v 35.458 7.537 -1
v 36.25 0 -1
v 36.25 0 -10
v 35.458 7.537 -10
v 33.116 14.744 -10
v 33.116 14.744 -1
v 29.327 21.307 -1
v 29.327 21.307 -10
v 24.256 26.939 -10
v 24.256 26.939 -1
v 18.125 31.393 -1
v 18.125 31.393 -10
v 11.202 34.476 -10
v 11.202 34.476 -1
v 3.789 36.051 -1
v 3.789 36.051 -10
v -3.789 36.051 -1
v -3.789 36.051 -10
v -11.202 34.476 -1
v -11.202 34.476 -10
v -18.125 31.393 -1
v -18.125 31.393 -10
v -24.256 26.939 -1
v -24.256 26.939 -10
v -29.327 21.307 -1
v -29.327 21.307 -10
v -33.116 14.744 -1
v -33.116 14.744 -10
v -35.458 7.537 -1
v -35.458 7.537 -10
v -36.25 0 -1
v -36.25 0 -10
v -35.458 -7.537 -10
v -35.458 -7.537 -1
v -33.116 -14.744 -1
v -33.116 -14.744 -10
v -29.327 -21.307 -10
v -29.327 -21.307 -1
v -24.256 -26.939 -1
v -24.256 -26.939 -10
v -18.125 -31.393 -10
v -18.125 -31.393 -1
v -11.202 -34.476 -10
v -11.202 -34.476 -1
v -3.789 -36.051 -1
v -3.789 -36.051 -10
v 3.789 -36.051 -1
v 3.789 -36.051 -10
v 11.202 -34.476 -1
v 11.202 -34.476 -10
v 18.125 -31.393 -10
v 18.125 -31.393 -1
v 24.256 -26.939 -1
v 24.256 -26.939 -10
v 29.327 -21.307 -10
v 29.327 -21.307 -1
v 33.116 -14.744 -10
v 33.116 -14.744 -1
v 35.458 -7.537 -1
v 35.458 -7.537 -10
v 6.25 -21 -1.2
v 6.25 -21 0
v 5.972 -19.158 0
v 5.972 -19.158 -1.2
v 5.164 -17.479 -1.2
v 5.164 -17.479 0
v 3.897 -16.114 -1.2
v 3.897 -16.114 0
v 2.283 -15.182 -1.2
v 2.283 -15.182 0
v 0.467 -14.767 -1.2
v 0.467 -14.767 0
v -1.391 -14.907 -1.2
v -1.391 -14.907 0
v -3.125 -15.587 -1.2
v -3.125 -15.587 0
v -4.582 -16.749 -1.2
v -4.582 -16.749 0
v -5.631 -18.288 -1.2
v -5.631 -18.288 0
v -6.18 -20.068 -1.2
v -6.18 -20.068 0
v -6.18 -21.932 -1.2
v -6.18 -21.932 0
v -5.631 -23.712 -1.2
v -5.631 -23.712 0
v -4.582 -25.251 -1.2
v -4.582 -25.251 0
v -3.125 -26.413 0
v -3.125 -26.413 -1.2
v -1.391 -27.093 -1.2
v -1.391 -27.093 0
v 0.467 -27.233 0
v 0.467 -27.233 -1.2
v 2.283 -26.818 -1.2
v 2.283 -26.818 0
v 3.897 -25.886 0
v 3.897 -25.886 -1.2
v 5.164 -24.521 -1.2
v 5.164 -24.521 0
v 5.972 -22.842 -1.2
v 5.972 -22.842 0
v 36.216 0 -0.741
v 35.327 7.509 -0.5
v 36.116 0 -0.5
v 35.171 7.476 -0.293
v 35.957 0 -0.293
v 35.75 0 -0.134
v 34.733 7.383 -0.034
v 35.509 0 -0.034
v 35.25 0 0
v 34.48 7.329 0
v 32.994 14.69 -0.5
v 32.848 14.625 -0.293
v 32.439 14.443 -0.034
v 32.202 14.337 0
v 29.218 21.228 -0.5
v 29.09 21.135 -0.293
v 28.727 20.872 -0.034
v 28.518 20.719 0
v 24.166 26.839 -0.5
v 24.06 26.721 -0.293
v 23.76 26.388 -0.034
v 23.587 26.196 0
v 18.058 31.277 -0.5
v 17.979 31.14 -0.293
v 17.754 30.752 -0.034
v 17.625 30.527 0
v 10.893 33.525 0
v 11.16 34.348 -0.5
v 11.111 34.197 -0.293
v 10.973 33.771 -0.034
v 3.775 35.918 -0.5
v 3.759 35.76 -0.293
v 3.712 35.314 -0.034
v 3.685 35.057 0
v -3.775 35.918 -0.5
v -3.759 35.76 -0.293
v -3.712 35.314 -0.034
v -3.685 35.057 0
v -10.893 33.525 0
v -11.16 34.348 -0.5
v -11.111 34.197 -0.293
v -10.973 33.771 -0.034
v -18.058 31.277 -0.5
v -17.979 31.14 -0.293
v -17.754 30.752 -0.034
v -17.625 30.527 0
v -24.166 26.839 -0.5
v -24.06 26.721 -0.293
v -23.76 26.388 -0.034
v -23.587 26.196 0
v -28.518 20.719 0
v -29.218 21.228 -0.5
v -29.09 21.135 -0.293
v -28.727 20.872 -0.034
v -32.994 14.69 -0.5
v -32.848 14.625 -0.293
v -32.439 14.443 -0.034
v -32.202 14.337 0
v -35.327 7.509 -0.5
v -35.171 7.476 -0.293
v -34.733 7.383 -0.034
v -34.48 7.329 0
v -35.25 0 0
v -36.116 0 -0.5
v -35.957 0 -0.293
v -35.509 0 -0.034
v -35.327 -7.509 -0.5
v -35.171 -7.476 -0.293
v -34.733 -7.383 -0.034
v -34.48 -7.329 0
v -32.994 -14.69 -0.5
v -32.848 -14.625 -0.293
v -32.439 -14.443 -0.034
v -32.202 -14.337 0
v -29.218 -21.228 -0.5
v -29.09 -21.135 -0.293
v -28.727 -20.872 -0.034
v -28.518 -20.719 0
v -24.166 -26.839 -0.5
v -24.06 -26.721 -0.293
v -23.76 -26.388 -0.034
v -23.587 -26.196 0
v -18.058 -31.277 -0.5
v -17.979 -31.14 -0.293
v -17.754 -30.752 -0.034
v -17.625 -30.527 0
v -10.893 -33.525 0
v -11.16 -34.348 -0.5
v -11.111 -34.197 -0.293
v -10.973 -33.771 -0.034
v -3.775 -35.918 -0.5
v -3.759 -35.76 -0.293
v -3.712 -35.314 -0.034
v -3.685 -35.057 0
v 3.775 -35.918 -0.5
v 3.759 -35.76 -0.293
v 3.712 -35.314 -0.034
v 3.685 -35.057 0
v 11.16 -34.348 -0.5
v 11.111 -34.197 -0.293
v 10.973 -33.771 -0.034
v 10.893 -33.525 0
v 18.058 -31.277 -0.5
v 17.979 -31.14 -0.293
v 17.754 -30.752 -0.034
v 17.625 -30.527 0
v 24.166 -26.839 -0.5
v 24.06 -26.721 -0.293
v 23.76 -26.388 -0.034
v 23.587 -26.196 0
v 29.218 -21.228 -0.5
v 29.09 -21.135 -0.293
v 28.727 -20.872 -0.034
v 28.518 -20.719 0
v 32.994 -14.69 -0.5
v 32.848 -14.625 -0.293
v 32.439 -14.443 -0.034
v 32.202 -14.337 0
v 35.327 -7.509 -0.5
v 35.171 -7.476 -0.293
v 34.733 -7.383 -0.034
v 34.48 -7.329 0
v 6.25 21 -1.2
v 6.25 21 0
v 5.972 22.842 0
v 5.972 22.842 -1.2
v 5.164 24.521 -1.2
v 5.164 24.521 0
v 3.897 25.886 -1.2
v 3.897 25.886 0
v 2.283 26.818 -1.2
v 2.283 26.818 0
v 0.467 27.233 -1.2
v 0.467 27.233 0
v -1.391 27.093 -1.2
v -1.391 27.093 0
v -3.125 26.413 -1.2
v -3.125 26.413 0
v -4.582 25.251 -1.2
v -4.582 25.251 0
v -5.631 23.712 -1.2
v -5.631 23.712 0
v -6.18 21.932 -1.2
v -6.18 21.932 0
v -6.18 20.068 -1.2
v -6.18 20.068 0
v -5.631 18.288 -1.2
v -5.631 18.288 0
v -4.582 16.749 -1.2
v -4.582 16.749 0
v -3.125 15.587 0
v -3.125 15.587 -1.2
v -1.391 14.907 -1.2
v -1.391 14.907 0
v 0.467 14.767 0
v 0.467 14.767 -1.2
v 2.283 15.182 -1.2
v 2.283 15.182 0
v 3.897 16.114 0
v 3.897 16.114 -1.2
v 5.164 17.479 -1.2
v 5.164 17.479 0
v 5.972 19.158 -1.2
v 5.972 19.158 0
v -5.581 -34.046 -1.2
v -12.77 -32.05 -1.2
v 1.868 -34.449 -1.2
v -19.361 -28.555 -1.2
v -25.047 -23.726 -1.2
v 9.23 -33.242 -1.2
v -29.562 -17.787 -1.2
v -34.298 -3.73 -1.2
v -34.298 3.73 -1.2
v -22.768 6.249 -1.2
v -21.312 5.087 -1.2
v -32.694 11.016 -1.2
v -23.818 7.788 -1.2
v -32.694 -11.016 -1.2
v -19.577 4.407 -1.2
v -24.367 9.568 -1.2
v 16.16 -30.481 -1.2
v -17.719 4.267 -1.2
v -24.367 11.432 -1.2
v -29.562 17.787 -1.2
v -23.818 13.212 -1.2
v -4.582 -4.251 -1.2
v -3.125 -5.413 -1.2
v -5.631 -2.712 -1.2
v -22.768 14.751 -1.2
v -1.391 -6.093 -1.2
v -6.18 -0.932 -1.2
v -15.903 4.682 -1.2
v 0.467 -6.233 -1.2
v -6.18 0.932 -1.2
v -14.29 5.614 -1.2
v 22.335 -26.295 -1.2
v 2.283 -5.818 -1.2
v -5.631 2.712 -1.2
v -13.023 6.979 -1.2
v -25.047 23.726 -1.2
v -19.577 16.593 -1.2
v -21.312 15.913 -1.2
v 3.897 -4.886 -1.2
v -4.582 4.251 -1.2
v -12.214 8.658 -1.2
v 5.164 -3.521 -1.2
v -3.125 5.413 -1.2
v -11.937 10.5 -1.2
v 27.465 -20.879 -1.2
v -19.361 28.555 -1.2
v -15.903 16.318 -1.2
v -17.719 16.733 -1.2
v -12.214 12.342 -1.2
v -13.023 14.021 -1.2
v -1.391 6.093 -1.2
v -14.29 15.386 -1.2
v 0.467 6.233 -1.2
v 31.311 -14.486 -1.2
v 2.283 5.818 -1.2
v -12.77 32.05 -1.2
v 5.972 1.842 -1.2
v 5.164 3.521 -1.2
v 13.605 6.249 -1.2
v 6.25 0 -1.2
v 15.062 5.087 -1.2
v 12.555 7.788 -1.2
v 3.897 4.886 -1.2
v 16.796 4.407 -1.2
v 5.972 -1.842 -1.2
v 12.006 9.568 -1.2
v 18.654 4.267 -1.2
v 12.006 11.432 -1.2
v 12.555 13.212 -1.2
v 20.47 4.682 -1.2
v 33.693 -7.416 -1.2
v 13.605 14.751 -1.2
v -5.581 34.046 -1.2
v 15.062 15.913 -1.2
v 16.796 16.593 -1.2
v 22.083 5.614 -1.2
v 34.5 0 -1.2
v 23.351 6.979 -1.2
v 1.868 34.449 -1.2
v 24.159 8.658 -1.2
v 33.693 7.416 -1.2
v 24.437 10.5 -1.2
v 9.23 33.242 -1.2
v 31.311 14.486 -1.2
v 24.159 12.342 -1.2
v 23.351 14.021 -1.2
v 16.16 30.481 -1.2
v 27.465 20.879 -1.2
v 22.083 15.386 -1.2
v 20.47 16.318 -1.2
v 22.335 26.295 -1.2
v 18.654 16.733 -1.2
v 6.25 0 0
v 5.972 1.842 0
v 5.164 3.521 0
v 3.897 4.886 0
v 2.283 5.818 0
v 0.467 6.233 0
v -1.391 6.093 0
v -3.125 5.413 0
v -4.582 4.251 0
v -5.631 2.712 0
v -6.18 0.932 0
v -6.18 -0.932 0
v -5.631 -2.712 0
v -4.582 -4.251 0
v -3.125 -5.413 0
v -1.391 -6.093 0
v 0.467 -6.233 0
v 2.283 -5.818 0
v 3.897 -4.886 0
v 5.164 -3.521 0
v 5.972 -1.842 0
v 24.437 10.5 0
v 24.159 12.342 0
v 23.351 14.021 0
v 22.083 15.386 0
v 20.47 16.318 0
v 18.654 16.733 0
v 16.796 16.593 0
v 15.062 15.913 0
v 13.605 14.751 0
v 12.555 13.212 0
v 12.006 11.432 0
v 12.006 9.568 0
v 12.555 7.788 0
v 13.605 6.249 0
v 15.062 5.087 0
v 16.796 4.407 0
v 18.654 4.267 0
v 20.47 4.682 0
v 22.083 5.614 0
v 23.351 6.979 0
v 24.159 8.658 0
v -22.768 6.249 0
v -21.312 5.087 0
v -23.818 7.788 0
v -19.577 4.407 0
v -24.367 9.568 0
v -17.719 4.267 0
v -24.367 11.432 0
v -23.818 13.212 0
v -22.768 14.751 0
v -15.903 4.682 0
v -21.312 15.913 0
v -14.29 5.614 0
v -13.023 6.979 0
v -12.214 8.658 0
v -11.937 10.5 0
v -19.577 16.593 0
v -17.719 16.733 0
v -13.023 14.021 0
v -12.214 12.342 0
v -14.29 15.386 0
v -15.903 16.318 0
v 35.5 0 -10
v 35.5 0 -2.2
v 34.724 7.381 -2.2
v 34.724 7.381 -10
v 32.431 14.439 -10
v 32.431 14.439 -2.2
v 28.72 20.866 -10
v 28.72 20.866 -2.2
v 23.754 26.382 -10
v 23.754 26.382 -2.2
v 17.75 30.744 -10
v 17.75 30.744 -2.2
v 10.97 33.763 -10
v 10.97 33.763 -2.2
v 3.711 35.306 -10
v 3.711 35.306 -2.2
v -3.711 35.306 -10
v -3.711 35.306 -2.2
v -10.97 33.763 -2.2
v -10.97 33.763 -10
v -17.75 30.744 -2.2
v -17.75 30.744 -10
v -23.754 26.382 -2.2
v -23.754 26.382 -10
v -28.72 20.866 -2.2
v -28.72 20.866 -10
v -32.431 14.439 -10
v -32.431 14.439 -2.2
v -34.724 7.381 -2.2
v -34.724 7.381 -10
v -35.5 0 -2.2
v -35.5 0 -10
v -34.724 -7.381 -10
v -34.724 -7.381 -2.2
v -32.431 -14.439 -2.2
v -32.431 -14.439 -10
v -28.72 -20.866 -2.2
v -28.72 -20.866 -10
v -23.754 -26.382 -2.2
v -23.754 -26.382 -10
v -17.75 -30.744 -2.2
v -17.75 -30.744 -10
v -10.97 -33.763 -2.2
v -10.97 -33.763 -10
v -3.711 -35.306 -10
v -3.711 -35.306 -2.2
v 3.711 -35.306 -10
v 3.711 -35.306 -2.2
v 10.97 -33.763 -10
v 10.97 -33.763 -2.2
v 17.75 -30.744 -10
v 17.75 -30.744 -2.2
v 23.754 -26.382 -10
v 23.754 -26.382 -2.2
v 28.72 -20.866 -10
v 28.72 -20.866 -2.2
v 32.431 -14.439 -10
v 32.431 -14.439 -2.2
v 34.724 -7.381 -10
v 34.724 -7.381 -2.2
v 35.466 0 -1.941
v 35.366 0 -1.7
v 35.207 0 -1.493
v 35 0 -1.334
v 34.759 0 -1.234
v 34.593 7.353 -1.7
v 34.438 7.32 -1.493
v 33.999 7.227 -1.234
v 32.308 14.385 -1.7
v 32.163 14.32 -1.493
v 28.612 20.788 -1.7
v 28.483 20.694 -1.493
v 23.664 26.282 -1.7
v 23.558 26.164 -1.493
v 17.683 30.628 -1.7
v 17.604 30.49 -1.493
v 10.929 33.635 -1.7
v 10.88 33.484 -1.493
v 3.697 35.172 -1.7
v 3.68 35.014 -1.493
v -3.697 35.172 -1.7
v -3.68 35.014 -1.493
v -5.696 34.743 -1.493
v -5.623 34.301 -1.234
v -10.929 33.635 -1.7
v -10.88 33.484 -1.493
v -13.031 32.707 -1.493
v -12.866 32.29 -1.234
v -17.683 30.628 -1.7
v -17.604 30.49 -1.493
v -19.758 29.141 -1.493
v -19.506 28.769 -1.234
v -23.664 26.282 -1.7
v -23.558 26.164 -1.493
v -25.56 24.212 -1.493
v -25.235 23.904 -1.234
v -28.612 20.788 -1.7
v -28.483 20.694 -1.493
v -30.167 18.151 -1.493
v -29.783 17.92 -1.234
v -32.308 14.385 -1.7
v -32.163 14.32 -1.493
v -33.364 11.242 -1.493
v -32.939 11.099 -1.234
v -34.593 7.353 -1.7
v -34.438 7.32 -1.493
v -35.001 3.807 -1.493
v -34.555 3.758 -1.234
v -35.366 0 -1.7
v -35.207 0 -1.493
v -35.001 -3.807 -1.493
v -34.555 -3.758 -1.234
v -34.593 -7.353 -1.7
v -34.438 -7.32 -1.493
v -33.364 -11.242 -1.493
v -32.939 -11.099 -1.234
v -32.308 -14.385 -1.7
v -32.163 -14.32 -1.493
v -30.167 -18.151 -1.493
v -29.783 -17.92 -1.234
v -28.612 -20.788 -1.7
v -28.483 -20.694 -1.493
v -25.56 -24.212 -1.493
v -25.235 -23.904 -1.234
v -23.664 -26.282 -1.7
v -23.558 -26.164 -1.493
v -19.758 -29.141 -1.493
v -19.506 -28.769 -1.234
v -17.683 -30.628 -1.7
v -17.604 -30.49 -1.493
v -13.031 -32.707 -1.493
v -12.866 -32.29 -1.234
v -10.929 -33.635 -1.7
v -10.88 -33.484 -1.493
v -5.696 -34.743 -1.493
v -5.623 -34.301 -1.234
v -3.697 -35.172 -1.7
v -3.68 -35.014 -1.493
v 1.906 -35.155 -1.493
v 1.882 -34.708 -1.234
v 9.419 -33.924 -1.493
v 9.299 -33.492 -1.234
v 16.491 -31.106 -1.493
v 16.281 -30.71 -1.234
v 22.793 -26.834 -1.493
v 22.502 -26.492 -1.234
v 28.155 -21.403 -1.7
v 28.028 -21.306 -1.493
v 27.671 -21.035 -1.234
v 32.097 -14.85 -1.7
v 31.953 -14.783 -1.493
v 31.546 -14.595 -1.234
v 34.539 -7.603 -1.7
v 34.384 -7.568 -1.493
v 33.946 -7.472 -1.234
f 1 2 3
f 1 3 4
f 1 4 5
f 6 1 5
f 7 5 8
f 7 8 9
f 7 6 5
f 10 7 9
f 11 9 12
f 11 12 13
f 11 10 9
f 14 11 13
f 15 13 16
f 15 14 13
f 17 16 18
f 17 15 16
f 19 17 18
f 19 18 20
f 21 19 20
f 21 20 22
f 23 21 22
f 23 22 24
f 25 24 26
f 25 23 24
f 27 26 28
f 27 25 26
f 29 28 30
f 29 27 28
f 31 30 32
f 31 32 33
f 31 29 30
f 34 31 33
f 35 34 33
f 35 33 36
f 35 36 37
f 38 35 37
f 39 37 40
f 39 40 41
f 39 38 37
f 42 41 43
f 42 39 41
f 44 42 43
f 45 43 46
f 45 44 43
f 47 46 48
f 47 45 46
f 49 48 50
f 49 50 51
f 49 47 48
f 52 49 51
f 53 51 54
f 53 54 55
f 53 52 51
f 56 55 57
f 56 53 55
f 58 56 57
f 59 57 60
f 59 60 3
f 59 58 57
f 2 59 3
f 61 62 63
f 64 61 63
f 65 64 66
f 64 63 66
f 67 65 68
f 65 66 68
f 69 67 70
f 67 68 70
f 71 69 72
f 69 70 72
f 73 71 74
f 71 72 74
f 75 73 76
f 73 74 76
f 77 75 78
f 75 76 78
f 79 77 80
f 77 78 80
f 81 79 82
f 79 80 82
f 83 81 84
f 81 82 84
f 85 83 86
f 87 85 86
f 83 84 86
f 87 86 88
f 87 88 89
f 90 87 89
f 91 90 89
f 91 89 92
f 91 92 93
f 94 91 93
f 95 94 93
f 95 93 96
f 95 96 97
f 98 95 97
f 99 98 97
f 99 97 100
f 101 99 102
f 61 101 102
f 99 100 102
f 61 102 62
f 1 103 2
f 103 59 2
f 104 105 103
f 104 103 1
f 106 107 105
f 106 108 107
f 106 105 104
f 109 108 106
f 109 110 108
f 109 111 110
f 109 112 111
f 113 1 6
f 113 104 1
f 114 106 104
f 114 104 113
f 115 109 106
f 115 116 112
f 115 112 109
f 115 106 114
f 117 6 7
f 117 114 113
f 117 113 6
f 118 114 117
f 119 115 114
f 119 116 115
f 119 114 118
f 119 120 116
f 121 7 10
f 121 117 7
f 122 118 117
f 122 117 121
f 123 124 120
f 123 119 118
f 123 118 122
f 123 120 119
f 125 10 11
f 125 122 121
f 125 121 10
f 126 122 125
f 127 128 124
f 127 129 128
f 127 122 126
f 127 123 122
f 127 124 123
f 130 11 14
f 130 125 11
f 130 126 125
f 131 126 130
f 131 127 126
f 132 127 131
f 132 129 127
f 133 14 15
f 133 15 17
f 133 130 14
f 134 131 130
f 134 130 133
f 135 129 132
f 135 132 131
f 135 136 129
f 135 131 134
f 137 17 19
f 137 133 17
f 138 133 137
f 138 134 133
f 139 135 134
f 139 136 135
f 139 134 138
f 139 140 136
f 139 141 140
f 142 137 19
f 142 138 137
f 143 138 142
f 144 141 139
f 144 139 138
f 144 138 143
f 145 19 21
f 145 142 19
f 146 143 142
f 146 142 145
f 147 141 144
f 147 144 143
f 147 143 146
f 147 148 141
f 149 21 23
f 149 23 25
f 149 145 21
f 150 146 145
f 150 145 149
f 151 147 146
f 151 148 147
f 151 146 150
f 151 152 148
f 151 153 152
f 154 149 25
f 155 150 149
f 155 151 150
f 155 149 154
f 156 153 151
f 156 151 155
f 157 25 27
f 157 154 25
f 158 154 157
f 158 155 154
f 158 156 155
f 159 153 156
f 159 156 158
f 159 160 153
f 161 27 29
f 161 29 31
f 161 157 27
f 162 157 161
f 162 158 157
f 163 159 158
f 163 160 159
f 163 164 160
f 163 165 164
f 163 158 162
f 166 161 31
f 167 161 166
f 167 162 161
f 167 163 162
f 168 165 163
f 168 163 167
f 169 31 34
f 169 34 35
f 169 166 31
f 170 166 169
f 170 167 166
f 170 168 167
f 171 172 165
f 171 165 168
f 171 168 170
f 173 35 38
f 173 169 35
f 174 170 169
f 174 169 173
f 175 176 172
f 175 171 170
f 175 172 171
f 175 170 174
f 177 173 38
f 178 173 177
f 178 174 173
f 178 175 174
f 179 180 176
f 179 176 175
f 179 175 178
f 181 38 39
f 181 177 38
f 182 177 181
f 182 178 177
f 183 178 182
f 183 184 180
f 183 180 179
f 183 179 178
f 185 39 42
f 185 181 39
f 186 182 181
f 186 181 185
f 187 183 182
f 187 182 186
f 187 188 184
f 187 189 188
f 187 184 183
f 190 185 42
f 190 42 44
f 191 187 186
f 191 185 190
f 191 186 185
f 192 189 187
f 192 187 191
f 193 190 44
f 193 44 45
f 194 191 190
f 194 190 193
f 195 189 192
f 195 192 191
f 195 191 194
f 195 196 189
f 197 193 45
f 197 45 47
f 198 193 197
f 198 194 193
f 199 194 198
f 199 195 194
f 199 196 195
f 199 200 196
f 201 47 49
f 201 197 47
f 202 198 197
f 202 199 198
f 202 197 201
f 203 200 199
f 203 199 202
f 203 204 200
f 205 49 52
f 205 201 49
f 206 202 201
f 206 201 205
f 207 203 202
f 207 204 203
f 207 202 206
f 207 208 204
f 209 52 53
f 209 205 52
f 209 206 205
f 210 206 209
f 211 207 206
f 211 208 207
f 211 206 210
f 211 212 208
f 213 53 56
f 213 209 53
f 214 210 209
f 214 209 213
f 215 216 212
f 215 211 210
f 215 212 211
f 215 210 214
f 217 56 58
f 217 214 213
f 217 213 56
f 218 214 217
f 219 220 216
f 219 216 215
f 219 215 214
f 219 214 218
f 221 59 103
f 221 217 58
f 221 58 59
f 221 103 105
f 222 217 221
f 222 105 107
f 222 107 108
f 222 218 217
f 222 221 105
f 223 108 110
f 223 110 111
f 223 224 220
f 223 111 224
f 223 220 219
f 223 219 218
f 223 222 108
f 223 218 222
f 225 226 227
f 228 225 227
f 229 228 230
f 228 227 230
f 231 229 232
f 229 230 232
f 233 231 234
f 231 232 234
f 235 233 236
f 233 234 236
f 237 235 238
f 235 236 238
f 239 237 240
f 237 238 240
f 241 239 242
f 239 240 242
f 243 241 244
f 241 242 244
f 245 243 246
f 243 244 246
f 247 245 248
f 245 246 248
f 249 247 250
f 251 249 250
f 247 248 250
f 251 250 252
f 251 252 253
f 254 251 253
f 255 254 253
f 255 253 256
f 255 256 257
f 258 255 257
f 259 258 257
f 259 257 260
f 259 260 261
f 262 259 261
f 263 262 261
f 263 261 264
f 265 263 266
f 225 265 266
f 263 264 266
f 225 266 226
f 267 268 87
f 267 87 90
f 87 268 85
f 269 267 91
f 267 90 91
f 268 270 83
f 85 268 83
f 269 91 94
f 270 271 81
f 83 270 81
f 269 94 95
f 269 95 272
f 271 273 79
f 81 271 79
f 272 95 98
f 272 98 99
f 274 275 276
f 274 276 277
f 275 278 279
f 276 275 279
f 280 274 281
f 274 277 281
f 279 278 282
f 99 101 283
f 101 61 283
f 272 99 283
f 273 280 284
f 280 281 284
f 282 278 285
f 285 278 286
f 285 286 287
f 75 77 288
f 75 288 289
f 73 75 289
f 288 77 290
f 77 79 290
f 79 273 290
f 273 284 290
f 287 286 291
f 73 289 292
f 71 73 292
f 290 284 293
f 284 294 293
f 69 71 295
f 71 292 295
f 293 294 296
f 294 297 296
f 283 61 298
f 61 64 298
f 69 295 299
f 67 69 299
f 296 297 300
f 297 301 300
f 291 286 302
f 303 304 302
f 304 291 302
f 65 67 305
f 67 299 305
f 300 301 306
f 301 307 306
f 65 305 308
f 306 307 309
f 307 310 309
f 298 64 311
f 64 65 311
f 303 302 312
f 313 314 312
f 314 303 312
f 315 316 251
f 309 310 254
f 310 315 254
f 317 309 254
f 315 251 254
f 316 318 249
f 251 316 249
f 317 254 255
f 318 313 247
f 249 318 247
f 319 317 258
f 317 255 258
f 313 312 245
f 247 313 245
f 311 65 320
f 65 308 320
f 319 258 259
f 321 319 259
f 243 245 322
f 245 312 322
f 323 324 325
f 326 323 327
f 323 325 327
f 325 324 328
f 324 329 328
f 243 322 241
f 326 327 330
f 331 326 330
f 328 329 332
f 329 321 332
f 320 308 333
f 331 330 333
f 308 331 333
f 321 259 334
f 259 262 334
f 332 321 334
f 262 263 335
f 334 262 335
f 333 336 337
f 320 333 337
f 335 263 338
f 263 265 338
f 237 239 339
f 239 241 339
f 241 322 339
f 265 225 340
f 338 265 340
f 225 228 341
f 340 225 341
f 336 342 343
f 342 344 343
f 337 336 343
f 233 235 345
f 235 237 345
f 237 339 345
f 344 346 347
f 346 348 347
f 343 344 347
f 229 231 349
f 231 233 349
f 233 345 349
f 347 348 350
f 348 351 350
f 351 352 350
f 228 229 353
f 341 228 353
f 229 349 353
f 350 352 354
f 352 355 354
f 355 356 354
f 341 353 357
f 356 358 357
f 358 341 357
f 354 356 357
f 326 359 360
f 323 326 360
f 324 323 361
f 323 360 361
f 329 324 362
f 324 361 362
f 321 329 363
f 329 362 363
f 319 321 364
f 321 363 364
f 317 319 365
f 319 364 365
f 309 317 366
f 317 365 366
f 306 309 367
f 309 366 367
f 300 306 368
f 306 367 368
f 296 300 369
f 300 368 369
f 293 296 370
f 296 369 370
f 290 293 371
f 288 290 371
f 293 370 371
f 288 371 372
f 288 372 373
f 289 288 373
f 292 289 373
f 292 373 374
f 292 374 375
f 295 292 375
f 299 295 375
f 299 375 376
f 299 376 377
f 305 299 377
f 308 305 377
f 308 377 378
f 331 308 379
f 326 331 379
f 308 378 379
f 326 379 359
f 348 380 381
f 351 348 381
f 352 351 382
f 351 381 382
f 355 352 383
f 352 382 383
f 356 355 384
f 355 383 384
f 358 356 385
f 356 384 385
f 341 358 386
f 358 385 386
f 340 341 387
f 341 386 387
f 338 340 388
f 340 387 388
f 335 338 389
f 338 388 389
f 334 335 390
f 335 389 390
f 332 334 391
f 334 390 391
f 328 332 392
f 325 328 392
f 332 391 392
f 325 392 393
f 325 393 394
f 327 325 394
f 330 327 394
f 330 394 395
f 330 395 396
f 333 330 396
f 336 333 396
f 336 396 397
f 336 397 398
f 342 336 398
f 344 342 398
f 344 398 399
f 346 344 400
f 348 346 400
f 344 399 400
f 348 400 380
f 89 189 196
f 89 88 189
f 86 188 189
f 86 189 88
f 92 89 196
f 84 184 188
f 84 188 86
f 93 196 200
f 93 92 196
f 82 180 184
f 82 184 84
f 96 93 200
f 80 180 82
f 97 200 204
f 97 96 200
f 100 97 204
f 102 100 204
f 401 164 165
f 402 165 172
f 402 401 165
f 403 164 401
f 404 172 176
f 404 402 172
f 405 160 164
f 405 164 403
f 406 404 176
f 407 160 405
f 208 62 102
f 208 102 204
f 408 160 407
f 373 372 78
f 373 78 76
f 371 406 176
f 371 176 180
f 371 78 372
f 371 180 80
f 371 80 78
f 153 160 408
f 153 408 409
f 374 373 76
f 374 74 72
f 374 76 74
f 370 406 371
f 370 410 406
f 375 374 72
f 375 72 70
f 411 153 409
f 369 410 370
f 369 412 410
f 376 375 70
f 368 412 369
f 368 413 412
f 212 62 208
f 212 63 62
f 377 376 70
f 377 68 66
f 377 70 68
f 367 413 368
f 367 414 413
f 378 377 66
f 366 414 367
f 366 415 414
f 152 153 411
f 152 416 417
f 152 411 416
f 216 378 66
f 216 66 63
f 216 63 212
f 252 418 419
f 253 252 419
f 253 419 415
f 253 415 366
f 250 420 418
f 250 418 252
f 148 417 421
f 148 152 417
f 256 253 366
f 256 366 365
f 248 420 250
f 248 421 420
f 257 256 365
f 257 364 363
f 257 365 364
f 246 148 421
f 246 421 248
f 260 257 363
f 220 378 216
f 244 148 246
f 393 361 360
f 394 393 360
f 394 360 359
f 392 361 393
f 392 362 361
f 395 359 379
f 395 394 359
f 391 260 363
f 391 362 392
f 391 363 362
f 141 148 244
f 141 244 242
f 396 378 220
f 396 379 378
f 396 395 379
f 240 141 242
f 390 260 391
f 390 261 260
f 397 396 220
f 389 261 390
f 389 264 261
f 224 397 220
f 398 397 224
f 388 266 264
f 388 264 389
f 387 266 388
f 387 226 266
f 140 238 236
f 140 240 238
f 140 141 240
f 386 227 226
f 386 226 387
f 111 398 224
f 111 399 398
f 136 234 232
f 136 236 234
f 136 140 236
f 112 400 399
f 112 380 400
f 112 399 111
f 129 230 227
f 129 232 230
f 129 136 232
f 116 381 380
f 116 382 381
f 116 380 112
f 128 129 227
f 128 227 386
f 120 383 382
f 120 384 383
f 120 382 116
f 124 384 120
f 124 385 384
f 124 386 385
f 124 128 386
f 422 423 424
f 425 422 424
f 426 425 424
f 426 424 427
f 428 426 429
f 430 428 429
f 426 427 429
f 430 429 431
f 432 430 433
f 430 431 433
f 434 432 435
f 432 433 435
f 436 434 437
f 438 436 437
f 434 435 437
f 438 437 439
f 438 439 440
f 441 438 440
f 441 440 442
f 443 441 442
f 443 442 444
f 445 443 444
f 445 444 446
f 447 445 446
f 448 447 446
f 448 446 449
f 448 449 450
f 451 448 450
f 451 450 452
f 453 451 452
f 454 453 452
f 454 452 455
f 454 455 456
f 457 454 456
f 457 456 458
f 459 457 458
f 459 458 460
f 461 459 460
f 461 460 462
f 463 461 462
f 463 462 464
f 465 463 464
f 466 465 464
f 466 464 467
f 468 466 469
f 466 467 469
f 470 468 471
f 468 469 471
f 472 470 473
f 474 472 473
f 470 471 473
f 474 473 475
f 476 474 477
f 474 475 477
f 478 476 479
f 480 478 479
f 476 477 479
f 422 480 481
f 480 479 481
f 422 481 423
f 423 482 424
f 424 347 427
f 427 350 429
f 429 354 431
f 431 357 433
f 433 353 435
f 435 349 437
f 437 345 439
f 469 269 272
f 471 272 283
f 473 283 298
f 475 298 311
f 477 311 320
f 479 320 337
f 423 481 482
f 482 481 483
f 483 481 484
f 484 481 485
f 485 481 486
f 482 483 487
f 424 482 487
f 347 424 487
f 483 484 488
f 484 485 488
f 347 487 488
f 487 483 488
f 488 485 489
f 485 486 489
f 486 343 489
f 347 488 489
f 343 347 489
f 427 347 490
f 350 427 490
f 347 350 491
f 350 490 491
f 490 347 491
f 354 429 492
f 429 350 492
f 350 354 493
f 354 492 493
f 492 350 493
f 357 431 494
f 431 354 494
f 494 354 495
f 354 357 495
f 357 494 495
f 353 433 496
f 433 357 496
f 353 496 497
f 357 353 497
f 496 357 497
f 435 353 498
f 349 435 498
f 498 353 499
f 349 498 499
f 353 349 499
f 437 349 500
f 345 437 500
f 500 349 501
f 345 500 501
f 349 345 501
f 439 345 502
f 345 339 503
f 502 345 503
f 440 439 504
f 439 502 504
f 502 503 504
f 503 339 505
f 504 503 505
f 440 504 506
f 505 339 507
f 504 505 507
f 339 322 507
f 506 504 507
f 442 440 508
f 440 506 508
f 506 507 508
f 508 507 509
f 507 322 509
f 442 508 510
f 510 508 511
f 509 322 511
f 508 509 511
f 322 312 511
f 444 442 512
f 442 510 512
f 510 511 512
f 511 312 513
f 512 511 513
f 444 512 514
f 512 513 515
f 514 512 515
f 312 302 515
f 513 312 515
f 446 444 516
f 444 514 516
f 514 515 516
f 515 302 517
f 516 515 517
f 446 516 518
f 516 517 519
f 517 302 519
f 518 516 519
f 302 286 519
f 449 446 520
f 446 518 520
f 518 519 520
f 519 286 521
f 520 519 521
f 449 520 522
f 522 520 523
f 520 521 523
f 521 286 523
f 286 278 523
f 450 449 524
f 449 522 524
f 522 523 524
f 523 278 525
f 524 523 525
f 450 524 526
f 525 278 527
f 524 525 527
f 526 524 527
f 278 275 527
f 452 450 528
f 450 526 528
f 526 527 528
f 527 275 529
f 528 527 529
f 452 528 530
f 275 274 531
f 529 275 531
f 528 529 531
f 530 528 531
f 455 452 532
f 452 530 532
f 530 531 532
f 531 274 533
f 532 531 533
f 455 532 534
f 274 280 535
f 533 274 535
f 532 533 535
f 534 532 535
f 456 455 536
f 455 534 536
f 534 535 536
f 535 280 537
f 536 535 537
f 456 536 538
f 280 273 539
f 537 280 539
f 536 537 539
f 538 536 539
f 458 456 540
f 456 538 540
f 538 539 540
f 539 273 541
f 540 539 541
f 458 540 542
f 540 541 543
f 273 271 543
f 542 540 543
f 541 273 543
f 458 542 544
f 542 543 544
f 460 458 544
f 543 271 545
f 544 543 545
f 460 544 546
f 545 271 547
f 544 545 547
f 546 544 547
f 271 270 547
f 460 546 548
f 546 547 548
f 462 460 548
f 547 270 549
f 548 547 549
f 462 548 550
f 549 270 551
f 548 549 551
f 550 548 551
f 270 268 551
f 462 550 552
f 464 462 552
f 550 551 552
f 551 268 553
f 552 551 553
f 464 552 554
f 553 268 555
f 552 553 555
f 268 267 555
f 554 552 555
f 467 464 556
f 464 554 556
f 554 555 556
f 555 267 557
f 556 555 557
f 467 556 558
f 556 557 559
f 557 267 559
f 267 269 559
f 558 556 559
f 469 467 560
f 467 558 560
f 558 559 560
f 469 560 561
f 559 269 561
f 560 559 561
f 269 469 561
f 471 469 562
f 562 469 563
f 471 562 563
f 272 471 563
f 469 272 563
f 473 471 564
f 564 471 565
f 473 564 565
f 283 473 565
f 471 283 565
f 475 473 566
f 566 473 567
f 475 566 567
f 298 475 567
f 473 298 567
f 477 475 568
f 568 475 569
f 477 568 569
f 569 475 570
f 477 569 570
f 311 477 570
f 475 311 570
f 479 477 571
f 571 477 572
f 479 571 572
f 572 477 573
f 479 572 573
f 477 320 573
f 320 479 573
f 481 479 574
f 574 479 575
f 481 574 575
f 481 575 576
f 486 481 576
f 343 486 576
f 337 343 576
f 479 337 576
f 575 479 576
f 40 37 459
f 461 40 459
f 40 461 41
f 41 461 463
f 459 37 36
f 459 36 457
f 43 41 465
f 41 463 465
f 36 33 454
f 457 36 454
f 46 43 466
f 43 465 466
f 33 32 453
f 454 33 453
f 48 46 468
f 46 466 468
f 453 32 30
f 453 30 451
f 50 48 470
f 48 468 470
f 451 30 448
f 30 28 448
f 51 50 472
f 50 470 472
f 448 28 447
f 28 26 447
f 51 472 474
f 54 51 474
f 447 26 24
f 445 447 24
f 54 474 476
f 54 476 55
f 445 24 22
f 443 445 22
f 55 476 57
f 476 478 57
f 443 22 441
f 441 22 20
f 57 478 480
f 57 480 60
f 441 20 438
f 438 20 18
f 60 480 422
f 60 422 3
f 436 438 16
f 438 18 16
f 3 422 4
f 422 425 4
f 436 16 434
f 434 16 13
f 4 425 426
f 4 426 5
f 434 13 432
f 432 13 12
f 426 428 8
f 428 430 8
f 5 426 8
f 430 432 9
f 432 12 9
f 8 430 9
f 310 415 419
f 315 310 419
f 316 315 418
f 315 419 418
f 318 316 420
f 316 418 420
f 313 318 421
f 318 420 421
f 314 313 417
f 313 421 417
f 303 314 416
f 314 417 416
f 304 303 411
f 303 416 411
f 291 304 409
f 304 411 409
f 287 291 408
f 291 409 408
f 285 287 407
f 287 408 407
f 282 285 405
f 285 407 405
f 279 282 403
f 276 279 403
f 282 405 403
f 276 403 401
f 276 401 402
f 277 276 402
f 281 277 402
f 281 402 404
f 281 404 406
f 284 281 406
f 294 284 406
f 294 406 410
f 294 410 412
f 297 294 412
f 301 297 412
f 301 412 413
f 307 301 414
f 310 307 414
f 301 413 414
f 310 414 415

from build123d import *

# Parameters (mm, degrees)
F0_R     = 35.5
F0_R_2   = 6.25
F1_DEPTH = 1.2
F0_R_3   = 36.25
F2_DEPTH = 10
F3_R     = 1


with BuildPart() as f1:
    # F0 (on Top) → F1 (new body)
    with BuildSketch(Plane.XY):
        Circle(F0_R)
        with Locations((0, -21)):
            Circle(F0_R_2, mode=Mode.SUBTRACT)
        with Locations((-18.186533, 10.5)):
            Circle(F0_R_2, mode=Mode.SUBTRACT)
        Circle(F0_R_2, mode=Mode.SUBTRACT)
        with Locations((18.186533, 10.5)):
            Circle(F0_R_2, mode=Mode.SUBTRACT)
        with Locations((0, 21)):
            Circle(F0_R_2, mode=Mode.SUBTRACT)
    extrude(amount=-F1_DEPTH)

    # F0 (on Top) → F2 (join)
    with BuildSketch(Plane.XY):
        Circle(F0_R_3)
        Circle(F0_R, mode=Mode.SUBTRACT)
    extrude(amount=-F2_DEPTH)

    # F3
    f3_edges = [f1.edges().sort_by_distance(p)[0] for p in [
        (-36.25, 0, 0),
        (-35.5, 0, -1.2),
    ]]
    fillet(f3_edges, radius=F3_R)


solid = f1.part
